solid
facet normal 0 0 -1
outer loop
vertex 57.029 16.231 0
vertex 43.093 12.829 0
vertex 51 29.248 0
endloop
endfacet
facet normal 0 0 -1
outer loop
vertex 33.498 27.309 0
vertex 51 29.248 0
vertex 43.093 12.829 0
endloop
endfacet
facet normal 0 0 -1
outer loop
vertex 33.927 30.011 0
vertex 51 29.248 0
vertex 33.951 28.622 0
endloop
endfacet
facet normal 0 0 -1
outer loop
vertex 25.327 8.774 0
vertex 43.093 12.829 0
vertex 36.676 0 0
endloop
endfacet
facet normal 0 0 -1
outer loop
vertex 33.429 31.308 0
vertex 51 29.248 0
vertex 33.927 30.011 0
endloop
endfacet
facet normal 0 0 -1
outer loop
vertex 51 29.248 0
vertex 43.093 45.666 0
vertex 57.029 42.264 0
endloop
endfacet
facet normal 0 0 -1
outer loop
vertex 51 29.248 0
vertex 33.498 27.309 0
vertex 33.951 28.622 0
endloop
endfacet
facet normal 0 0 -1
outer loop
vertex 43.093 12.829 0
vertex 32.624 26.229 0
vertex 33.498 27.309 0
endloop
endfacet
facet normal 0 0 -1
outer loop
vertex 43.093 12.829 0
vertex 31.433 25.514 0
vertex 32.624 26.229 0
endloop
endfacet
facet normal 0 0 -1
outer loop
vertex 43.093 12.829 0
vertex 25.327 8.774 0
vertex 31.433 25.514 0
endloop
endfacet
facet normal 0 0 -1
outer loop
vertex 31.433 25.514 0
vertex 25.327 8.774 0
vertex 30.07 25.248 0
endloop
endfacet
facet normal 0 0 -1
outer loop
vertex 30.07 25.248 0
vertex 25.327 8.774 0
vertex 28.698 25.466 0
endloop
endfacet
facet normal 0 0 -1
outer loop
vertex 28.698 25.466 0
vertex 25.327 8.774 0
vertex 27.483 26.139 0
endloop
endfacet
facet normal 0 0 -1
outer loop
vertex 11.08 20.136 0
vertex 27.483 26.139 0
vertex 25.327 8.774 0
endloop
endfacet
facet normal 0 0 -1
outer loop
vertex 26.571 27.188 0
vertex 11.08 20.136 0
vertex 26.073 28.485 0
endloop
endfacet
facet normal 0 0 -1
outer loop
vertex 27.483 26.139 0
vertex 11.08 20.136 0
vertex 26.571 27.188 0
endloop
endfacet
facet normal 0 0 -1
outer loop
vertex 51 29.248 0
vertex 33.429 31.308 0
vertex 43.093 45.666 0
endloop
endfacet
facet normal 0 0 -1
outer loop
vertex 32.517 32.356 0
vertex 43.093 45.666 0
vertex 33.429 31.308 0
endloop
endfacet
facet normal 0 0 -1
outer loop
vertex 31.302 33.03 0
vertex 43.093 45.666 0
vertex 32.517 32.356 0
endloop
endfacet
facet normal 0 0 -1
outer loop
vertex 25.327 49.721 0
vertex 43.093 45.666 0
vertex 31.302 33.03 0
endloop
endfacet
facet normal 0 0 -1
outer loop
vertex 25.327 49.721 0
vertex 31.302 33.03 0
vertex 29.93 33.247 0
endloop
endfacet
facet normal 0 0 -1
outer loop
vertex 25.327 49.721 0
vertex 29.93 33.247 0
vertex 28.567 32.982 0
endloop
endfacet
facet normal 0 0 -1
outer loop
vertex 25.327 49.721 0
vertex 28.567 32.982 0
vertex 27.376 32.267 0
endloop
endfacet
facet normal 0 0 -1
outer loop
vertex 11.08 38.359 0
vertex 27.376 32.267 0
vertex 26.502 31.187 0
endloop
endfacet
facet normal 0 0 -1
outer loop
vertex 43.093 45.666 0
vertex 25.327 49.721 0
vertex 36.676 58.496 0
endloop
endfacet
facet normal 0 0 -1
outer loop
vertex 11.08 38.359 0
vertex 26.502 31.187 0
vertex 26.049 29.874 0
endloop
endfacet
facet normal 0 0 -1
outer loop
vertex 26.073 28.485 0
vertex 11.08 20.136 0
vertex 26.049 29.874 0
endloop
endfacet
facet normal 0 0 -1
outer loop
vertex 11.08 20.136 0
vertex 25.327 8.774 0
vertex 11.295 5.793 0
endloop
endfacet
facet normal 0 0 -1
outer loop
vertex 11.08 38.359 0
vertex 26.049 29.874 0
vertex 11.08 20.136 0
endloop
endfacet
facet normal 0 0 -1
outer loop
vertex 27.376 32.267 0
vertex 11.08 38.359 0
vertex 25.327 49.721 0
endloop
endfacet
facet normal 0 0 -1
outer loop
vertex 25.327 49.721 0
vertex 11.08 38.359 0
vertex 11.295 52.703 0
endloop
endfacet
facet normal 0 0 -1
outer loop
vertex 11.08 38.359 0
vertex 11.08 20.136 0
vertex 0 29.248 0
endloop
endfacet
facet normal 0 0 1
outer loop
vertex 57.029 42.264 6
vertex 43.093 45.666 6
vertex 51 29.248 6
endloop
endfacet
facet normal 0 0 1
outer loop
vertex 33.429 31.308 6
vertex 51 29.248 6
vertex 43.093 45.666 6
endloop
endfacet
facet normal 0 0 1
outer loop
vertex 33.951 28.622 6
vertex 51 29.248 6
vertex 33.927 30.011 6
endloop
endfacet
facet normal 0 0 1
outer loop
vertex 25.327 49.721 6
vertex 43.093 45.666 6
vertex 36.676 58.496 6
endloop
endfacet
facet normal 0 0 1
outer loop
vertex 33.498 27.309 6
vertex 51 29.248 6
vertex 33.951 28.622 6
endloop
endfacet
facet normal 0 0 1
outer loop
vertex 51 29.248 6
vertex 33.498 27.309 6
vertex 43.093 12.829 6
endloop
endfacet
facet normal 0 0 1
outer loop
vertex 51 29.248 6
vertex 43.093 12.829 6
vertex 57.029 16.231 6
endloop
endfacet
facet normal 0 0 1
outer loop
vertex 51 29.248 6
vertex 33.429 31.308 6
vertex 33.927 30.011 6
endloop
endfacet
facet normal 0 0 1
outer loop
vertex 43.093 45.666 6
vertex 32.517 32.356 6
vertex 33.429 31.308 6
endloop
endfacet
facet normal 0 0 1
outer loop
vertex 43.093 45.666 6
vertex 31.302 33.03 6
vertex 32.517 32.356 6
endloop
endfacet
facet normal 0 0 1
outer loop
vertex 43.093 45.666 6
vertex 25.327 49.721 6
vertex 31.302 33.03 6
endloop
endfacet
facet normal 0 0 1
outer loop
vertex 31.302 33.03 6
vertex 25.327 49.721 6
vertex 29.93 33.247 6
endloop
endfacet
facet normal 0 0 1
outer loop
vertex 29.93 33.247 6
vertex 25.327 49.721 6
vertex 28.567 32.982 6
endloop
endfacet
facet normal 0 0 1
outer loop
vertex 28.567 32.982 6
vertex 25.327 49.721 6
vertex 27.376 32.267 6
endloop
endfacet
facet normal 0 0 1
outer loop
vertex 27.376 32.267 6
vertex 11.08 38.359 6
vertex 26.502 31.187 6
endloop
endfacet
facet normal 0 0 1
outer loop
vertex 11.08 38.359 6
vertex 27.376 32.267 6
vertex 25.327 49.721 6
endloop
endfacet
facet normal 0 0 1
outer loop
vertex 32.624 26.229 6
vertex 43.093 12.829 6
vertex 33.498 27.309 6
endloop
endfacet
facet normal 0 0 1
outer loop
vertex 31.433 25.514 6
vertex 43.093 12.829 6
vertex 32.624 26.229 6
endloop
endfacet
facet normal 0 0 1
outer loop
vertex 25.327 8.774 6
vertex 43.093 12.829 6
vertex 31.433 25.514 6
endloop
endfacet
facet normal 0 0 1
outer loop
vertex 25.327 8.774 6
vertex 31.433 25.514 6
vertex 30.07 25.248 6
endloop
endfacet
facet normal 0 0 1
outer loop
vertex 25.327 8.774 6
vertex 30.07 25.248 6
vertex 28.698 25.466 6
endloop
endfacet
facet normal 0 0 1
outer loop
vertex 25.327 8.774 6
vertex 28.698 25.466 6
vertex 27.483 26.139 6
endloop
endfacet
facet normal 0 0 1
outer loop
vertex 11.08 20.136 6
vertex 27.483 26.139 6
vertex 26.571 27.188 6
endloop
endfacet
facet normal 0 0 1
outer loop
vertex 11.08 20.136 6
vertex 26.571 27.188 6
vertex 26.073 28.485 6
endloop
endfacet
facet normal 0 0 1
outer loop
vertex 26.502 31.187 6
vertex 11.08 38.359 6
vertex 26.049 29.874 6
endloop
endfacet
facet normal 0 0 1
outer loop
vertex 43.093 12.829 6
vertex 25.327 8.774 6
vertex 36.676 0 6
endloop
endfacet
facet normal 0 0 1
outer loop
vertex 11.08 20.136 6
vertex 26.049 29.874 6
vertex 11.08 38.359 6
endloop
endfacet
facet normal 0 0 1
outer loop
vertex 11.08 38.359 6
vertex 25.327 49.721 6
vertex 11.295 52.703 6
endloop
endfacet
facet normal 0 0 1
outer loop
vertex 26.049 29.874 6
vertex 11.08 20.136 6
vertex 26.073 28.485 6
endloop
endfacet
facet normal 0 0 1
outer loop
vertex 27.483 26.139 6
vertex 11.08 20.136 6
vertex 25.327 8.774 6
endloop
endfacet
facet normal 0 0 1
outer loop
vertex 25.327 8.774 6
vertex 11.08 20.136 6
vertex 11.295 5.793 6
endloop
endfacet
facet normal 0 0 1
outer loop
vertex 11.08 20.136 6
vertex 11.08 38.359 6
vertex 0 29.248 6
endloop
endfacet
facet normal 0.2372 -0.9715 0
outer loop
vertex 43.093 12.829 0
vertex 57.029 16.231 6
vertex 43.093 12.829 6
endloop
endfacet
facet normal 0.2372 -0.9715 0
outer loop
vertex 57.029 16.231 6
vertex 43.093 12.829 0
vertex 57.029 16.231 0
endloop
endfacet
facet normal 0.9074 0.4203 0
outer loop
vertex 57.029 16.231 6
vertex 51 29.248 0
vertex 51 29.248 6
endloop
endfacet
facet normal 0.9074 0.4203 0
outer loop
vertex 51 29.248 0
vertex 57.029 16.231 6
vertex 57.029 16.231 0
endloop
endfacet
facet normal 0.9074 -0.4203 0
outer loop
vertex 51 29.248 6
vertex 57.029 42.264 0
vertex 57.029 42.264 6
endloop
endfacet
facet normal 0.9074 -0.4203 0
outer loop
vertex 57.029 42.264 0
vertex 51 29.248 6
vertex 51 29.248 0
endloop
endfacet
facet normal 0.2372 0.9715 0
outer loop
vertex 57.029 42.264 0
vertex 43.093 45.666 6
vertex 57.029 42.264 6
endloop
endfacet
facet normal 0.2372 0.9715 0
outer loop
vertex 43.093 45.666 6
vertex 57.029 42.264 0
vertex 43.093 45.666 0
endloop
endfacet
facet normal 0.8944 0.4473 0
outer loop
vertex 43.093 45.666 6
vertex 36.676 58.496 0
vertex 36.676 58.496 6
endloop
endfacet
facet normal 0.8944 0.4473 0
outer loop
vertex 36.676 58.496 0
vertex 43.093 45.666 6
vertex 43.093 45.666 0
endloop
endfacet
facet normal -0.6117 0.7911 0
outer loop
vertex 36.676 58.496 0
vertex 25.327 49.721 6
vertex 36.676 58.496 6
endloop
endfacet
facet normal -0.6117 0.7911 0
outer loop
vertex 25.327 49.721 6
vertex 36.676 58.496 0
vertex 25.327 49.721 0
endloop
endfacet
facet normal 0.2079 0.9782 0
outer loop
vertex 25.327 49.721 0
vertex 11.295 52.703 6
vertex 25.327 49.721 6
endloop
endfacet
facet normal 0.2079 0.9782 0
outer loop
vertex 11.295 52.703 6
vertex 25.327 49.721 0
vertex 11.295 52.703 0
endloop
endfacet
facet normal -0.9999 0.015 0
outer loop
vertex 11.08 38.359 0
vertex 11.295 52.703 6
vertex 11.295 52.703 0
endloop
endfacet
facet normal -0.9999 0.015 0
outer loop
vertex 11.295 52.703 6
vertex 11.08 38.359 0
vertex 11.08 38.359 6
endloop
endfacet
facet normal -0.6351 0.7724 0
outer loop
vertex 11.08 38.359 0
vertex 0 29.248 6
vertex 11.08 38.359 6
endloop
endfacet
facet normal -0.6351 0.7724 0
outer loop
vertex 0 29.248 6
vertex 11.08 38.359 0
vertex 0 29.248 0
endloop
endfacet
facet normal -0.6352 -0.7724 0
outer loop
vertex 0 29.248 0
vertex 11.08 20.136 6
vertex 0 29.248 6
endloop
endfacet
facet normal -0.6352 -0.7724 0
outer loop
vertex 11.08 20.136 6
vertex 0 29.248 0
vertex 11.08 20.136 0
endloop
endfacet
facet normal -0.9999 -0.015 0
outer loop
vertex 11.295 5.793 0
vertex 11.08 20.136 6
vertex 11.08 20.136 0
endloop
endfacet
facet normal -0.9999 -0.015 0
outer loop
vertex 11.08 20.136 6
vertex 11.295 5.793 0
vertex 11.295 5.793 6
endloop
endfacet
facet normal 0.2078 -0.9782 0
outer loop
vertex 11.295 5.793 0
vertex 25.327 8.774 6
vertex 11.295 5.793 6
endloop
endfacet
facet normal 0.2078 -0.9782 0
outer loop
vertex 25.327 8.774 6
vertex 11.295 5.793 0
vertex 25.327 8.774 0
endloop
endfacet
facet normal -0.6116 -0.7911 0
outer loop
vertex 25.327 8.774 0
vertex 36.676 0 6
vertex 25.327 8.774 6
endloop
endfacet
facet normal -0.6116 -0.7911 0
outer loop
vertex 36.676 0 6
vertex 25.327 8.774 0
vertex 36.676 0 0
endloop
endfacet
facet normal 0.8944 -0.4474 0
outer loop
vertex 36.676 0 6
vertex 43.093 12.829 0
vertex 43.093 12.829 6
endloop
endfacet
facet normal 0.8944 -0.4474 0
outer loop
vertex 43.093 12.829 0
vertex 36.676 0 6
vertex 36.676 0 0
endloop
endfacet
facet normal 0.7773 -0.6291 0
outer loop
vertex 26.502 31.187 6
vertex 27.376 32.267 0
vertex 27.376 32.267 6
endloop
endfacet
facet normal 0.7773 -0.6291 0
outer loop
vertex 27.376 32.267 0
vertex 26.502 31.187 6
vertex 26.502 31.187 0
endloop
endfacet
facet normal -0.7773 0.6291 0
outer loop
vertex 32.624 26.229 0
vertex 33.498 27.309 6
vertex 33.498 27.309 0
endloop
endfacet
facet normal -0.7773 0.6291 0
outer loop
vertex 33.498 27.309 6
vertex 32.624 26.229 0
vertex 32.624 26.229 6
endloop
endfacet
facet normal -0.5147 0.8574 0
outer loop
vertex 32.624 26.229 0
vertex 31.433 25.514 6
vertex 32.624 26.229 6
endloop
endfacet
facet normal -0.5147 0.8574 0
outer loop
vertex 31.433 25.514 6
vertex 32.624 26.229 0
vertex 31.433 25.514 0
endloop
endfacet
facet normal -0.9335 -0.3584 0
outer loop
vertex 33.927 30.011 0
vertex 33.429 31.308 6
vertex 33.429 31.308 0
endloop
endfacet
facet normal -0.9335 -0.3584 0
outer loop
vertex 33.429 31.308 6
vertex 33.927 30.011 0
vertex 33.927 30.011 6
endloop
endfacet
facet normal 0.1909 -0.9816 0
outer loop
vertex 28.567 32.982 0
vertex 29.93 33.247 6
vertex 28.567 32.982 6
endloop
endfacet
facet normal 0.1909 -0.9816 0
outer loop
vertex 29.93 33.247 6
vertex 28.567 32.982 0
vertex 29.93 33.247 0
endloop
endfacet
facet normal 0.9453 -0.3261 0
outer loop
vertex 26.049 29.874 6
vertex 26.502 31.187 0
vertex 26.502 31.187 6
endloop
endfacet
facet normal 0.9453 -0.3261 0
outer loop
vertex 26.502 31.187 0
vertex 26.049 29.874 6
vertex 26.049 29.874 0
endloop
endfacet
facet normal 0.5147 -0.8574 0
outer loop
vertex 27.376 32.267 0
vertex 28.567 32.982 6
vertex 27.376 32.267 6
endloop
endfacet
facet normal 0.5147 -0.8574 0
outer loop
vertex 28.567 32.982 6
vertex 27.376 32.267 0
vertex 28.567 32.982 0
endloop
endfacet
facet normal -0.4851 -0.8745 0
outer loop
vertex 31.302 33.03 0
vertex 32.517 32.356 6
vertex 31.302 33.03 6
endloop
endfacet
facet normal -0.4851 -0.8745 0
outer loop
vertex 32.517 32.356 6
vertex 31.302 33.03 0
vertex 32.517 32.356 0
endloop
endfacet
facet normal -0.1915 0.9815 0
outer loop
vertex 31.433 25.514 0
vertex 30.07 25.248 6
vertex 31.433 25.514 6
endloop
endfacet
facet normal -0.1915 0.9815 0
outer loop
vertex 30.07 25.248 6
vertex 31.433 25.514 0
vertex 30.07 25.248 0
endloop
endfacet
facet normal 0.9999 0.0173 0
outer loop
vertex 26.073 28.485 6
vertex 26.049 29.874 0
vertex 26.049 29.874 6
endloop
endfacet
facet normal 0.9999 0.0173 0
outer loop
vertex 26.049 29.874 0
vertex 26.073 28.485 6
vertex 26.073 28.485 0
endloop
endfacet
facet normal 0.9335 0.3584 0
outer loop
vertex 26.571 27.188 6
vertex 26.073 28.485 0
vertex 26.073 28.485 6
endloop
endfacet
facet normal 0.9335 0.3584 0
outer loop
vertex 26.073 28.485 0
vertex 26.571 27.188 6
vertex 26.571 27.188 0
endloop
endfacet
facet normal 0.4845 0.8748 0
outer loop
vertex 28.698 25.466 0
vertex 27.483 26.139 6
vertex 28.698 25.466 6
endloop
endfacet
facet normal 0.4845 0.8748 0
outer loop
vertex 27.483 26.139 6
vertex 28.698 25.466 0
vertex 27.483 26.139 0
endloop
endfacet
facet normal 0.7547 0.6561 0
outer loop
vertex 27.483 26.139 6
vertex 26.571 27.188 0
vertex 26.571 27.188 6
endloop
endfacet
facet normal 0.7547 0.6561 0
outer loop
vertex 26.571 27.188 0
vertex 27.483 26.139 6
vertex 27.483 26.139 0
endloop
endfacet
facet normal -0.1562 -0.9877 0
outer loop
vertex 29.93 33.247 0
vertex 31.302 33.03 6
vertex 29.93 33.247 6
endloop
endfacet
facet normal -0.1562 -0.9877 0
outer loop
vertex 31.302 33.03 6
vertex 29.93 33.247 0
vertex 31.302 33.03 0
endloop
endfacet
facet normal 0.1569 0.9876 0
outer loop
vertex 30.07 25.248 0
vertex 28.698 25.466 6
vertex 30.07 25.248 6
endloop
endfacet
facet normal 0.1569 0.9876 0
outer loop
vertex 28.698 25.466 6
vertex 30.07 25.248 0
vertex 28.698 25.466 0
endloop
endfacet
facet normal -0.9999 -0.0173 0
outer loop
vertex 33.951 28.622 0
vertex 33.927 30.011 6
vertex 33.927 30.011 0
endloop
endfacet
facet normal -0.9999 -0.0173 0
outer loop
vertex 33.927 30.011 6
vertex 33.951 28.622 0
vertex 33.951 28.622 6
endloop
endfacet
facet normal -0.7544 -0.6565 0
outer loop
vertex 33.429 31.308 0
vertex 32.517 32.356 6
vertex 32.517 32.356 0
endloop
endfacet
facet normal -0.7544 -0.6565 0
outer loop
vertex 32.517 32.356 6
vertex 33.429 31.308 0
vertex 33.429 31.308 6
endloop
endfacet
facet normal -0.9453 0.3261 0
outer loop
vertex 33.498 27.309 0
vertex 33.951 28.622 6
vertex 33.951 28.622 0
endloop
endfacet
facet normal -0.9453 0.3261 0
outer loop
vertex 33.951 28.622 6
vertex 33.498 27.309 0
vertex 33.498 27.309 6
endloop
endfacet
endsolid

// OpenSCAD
$fn = 32;

// ----------------------------------------------------------------------
// Star wheel: 7-point blunt, R30
// ----------------------------------------------------------------------

// --- parameters (mm) ---
n_points = 7;             // number of points / teeth
r_out = 30;               // tip radius
r_in = 21;                // root radius
bore_r = 4;               // centre bore radius
plate_t = 6;              // plate thickness, Z (extrusion height)
bore_d = 8;               // centre bore diameter

profile = [[0, 29.248], [11.08, 20.136], [11.295, 5.793], [25.327, 8.774], [36.676, 0], [43.093, 12.829], [57.029, 16.231], [51, 29.248], [57.029, 42.264], [43.093, 45.666], [36.676, 58.496], [25.327, 49.721], [11.295, 52.703], [11.08, 38.359]];  // primary outline, 14 points, counter clockwise
void_1 = [[33.927, 30.011], [33.429, 31.308], [32.517, 32.356], [31.302, 33.03], [29.93, 33.247], [28.567, 32.982], [27.376, 32.267], [26.502, 31.187], [26.049, 29.874], [26.073, 28.485], [26.571, 27.188], [27.483, 26.139], [28.698, 25.466], [30.07, 25.248], [31.433, 25.514], [32.624, 26.229], [33.498, 27.309], [33.951, 28.622]];  // centre bore, 18 points

// --- the one profile operation ---
difference() {
  linear_extrude(height = plate_t) polygon(points = profile);
  translate([0, 0, -1])
    linear_extrude(height = plate_t + 2) polygon(points = void_1);
}
